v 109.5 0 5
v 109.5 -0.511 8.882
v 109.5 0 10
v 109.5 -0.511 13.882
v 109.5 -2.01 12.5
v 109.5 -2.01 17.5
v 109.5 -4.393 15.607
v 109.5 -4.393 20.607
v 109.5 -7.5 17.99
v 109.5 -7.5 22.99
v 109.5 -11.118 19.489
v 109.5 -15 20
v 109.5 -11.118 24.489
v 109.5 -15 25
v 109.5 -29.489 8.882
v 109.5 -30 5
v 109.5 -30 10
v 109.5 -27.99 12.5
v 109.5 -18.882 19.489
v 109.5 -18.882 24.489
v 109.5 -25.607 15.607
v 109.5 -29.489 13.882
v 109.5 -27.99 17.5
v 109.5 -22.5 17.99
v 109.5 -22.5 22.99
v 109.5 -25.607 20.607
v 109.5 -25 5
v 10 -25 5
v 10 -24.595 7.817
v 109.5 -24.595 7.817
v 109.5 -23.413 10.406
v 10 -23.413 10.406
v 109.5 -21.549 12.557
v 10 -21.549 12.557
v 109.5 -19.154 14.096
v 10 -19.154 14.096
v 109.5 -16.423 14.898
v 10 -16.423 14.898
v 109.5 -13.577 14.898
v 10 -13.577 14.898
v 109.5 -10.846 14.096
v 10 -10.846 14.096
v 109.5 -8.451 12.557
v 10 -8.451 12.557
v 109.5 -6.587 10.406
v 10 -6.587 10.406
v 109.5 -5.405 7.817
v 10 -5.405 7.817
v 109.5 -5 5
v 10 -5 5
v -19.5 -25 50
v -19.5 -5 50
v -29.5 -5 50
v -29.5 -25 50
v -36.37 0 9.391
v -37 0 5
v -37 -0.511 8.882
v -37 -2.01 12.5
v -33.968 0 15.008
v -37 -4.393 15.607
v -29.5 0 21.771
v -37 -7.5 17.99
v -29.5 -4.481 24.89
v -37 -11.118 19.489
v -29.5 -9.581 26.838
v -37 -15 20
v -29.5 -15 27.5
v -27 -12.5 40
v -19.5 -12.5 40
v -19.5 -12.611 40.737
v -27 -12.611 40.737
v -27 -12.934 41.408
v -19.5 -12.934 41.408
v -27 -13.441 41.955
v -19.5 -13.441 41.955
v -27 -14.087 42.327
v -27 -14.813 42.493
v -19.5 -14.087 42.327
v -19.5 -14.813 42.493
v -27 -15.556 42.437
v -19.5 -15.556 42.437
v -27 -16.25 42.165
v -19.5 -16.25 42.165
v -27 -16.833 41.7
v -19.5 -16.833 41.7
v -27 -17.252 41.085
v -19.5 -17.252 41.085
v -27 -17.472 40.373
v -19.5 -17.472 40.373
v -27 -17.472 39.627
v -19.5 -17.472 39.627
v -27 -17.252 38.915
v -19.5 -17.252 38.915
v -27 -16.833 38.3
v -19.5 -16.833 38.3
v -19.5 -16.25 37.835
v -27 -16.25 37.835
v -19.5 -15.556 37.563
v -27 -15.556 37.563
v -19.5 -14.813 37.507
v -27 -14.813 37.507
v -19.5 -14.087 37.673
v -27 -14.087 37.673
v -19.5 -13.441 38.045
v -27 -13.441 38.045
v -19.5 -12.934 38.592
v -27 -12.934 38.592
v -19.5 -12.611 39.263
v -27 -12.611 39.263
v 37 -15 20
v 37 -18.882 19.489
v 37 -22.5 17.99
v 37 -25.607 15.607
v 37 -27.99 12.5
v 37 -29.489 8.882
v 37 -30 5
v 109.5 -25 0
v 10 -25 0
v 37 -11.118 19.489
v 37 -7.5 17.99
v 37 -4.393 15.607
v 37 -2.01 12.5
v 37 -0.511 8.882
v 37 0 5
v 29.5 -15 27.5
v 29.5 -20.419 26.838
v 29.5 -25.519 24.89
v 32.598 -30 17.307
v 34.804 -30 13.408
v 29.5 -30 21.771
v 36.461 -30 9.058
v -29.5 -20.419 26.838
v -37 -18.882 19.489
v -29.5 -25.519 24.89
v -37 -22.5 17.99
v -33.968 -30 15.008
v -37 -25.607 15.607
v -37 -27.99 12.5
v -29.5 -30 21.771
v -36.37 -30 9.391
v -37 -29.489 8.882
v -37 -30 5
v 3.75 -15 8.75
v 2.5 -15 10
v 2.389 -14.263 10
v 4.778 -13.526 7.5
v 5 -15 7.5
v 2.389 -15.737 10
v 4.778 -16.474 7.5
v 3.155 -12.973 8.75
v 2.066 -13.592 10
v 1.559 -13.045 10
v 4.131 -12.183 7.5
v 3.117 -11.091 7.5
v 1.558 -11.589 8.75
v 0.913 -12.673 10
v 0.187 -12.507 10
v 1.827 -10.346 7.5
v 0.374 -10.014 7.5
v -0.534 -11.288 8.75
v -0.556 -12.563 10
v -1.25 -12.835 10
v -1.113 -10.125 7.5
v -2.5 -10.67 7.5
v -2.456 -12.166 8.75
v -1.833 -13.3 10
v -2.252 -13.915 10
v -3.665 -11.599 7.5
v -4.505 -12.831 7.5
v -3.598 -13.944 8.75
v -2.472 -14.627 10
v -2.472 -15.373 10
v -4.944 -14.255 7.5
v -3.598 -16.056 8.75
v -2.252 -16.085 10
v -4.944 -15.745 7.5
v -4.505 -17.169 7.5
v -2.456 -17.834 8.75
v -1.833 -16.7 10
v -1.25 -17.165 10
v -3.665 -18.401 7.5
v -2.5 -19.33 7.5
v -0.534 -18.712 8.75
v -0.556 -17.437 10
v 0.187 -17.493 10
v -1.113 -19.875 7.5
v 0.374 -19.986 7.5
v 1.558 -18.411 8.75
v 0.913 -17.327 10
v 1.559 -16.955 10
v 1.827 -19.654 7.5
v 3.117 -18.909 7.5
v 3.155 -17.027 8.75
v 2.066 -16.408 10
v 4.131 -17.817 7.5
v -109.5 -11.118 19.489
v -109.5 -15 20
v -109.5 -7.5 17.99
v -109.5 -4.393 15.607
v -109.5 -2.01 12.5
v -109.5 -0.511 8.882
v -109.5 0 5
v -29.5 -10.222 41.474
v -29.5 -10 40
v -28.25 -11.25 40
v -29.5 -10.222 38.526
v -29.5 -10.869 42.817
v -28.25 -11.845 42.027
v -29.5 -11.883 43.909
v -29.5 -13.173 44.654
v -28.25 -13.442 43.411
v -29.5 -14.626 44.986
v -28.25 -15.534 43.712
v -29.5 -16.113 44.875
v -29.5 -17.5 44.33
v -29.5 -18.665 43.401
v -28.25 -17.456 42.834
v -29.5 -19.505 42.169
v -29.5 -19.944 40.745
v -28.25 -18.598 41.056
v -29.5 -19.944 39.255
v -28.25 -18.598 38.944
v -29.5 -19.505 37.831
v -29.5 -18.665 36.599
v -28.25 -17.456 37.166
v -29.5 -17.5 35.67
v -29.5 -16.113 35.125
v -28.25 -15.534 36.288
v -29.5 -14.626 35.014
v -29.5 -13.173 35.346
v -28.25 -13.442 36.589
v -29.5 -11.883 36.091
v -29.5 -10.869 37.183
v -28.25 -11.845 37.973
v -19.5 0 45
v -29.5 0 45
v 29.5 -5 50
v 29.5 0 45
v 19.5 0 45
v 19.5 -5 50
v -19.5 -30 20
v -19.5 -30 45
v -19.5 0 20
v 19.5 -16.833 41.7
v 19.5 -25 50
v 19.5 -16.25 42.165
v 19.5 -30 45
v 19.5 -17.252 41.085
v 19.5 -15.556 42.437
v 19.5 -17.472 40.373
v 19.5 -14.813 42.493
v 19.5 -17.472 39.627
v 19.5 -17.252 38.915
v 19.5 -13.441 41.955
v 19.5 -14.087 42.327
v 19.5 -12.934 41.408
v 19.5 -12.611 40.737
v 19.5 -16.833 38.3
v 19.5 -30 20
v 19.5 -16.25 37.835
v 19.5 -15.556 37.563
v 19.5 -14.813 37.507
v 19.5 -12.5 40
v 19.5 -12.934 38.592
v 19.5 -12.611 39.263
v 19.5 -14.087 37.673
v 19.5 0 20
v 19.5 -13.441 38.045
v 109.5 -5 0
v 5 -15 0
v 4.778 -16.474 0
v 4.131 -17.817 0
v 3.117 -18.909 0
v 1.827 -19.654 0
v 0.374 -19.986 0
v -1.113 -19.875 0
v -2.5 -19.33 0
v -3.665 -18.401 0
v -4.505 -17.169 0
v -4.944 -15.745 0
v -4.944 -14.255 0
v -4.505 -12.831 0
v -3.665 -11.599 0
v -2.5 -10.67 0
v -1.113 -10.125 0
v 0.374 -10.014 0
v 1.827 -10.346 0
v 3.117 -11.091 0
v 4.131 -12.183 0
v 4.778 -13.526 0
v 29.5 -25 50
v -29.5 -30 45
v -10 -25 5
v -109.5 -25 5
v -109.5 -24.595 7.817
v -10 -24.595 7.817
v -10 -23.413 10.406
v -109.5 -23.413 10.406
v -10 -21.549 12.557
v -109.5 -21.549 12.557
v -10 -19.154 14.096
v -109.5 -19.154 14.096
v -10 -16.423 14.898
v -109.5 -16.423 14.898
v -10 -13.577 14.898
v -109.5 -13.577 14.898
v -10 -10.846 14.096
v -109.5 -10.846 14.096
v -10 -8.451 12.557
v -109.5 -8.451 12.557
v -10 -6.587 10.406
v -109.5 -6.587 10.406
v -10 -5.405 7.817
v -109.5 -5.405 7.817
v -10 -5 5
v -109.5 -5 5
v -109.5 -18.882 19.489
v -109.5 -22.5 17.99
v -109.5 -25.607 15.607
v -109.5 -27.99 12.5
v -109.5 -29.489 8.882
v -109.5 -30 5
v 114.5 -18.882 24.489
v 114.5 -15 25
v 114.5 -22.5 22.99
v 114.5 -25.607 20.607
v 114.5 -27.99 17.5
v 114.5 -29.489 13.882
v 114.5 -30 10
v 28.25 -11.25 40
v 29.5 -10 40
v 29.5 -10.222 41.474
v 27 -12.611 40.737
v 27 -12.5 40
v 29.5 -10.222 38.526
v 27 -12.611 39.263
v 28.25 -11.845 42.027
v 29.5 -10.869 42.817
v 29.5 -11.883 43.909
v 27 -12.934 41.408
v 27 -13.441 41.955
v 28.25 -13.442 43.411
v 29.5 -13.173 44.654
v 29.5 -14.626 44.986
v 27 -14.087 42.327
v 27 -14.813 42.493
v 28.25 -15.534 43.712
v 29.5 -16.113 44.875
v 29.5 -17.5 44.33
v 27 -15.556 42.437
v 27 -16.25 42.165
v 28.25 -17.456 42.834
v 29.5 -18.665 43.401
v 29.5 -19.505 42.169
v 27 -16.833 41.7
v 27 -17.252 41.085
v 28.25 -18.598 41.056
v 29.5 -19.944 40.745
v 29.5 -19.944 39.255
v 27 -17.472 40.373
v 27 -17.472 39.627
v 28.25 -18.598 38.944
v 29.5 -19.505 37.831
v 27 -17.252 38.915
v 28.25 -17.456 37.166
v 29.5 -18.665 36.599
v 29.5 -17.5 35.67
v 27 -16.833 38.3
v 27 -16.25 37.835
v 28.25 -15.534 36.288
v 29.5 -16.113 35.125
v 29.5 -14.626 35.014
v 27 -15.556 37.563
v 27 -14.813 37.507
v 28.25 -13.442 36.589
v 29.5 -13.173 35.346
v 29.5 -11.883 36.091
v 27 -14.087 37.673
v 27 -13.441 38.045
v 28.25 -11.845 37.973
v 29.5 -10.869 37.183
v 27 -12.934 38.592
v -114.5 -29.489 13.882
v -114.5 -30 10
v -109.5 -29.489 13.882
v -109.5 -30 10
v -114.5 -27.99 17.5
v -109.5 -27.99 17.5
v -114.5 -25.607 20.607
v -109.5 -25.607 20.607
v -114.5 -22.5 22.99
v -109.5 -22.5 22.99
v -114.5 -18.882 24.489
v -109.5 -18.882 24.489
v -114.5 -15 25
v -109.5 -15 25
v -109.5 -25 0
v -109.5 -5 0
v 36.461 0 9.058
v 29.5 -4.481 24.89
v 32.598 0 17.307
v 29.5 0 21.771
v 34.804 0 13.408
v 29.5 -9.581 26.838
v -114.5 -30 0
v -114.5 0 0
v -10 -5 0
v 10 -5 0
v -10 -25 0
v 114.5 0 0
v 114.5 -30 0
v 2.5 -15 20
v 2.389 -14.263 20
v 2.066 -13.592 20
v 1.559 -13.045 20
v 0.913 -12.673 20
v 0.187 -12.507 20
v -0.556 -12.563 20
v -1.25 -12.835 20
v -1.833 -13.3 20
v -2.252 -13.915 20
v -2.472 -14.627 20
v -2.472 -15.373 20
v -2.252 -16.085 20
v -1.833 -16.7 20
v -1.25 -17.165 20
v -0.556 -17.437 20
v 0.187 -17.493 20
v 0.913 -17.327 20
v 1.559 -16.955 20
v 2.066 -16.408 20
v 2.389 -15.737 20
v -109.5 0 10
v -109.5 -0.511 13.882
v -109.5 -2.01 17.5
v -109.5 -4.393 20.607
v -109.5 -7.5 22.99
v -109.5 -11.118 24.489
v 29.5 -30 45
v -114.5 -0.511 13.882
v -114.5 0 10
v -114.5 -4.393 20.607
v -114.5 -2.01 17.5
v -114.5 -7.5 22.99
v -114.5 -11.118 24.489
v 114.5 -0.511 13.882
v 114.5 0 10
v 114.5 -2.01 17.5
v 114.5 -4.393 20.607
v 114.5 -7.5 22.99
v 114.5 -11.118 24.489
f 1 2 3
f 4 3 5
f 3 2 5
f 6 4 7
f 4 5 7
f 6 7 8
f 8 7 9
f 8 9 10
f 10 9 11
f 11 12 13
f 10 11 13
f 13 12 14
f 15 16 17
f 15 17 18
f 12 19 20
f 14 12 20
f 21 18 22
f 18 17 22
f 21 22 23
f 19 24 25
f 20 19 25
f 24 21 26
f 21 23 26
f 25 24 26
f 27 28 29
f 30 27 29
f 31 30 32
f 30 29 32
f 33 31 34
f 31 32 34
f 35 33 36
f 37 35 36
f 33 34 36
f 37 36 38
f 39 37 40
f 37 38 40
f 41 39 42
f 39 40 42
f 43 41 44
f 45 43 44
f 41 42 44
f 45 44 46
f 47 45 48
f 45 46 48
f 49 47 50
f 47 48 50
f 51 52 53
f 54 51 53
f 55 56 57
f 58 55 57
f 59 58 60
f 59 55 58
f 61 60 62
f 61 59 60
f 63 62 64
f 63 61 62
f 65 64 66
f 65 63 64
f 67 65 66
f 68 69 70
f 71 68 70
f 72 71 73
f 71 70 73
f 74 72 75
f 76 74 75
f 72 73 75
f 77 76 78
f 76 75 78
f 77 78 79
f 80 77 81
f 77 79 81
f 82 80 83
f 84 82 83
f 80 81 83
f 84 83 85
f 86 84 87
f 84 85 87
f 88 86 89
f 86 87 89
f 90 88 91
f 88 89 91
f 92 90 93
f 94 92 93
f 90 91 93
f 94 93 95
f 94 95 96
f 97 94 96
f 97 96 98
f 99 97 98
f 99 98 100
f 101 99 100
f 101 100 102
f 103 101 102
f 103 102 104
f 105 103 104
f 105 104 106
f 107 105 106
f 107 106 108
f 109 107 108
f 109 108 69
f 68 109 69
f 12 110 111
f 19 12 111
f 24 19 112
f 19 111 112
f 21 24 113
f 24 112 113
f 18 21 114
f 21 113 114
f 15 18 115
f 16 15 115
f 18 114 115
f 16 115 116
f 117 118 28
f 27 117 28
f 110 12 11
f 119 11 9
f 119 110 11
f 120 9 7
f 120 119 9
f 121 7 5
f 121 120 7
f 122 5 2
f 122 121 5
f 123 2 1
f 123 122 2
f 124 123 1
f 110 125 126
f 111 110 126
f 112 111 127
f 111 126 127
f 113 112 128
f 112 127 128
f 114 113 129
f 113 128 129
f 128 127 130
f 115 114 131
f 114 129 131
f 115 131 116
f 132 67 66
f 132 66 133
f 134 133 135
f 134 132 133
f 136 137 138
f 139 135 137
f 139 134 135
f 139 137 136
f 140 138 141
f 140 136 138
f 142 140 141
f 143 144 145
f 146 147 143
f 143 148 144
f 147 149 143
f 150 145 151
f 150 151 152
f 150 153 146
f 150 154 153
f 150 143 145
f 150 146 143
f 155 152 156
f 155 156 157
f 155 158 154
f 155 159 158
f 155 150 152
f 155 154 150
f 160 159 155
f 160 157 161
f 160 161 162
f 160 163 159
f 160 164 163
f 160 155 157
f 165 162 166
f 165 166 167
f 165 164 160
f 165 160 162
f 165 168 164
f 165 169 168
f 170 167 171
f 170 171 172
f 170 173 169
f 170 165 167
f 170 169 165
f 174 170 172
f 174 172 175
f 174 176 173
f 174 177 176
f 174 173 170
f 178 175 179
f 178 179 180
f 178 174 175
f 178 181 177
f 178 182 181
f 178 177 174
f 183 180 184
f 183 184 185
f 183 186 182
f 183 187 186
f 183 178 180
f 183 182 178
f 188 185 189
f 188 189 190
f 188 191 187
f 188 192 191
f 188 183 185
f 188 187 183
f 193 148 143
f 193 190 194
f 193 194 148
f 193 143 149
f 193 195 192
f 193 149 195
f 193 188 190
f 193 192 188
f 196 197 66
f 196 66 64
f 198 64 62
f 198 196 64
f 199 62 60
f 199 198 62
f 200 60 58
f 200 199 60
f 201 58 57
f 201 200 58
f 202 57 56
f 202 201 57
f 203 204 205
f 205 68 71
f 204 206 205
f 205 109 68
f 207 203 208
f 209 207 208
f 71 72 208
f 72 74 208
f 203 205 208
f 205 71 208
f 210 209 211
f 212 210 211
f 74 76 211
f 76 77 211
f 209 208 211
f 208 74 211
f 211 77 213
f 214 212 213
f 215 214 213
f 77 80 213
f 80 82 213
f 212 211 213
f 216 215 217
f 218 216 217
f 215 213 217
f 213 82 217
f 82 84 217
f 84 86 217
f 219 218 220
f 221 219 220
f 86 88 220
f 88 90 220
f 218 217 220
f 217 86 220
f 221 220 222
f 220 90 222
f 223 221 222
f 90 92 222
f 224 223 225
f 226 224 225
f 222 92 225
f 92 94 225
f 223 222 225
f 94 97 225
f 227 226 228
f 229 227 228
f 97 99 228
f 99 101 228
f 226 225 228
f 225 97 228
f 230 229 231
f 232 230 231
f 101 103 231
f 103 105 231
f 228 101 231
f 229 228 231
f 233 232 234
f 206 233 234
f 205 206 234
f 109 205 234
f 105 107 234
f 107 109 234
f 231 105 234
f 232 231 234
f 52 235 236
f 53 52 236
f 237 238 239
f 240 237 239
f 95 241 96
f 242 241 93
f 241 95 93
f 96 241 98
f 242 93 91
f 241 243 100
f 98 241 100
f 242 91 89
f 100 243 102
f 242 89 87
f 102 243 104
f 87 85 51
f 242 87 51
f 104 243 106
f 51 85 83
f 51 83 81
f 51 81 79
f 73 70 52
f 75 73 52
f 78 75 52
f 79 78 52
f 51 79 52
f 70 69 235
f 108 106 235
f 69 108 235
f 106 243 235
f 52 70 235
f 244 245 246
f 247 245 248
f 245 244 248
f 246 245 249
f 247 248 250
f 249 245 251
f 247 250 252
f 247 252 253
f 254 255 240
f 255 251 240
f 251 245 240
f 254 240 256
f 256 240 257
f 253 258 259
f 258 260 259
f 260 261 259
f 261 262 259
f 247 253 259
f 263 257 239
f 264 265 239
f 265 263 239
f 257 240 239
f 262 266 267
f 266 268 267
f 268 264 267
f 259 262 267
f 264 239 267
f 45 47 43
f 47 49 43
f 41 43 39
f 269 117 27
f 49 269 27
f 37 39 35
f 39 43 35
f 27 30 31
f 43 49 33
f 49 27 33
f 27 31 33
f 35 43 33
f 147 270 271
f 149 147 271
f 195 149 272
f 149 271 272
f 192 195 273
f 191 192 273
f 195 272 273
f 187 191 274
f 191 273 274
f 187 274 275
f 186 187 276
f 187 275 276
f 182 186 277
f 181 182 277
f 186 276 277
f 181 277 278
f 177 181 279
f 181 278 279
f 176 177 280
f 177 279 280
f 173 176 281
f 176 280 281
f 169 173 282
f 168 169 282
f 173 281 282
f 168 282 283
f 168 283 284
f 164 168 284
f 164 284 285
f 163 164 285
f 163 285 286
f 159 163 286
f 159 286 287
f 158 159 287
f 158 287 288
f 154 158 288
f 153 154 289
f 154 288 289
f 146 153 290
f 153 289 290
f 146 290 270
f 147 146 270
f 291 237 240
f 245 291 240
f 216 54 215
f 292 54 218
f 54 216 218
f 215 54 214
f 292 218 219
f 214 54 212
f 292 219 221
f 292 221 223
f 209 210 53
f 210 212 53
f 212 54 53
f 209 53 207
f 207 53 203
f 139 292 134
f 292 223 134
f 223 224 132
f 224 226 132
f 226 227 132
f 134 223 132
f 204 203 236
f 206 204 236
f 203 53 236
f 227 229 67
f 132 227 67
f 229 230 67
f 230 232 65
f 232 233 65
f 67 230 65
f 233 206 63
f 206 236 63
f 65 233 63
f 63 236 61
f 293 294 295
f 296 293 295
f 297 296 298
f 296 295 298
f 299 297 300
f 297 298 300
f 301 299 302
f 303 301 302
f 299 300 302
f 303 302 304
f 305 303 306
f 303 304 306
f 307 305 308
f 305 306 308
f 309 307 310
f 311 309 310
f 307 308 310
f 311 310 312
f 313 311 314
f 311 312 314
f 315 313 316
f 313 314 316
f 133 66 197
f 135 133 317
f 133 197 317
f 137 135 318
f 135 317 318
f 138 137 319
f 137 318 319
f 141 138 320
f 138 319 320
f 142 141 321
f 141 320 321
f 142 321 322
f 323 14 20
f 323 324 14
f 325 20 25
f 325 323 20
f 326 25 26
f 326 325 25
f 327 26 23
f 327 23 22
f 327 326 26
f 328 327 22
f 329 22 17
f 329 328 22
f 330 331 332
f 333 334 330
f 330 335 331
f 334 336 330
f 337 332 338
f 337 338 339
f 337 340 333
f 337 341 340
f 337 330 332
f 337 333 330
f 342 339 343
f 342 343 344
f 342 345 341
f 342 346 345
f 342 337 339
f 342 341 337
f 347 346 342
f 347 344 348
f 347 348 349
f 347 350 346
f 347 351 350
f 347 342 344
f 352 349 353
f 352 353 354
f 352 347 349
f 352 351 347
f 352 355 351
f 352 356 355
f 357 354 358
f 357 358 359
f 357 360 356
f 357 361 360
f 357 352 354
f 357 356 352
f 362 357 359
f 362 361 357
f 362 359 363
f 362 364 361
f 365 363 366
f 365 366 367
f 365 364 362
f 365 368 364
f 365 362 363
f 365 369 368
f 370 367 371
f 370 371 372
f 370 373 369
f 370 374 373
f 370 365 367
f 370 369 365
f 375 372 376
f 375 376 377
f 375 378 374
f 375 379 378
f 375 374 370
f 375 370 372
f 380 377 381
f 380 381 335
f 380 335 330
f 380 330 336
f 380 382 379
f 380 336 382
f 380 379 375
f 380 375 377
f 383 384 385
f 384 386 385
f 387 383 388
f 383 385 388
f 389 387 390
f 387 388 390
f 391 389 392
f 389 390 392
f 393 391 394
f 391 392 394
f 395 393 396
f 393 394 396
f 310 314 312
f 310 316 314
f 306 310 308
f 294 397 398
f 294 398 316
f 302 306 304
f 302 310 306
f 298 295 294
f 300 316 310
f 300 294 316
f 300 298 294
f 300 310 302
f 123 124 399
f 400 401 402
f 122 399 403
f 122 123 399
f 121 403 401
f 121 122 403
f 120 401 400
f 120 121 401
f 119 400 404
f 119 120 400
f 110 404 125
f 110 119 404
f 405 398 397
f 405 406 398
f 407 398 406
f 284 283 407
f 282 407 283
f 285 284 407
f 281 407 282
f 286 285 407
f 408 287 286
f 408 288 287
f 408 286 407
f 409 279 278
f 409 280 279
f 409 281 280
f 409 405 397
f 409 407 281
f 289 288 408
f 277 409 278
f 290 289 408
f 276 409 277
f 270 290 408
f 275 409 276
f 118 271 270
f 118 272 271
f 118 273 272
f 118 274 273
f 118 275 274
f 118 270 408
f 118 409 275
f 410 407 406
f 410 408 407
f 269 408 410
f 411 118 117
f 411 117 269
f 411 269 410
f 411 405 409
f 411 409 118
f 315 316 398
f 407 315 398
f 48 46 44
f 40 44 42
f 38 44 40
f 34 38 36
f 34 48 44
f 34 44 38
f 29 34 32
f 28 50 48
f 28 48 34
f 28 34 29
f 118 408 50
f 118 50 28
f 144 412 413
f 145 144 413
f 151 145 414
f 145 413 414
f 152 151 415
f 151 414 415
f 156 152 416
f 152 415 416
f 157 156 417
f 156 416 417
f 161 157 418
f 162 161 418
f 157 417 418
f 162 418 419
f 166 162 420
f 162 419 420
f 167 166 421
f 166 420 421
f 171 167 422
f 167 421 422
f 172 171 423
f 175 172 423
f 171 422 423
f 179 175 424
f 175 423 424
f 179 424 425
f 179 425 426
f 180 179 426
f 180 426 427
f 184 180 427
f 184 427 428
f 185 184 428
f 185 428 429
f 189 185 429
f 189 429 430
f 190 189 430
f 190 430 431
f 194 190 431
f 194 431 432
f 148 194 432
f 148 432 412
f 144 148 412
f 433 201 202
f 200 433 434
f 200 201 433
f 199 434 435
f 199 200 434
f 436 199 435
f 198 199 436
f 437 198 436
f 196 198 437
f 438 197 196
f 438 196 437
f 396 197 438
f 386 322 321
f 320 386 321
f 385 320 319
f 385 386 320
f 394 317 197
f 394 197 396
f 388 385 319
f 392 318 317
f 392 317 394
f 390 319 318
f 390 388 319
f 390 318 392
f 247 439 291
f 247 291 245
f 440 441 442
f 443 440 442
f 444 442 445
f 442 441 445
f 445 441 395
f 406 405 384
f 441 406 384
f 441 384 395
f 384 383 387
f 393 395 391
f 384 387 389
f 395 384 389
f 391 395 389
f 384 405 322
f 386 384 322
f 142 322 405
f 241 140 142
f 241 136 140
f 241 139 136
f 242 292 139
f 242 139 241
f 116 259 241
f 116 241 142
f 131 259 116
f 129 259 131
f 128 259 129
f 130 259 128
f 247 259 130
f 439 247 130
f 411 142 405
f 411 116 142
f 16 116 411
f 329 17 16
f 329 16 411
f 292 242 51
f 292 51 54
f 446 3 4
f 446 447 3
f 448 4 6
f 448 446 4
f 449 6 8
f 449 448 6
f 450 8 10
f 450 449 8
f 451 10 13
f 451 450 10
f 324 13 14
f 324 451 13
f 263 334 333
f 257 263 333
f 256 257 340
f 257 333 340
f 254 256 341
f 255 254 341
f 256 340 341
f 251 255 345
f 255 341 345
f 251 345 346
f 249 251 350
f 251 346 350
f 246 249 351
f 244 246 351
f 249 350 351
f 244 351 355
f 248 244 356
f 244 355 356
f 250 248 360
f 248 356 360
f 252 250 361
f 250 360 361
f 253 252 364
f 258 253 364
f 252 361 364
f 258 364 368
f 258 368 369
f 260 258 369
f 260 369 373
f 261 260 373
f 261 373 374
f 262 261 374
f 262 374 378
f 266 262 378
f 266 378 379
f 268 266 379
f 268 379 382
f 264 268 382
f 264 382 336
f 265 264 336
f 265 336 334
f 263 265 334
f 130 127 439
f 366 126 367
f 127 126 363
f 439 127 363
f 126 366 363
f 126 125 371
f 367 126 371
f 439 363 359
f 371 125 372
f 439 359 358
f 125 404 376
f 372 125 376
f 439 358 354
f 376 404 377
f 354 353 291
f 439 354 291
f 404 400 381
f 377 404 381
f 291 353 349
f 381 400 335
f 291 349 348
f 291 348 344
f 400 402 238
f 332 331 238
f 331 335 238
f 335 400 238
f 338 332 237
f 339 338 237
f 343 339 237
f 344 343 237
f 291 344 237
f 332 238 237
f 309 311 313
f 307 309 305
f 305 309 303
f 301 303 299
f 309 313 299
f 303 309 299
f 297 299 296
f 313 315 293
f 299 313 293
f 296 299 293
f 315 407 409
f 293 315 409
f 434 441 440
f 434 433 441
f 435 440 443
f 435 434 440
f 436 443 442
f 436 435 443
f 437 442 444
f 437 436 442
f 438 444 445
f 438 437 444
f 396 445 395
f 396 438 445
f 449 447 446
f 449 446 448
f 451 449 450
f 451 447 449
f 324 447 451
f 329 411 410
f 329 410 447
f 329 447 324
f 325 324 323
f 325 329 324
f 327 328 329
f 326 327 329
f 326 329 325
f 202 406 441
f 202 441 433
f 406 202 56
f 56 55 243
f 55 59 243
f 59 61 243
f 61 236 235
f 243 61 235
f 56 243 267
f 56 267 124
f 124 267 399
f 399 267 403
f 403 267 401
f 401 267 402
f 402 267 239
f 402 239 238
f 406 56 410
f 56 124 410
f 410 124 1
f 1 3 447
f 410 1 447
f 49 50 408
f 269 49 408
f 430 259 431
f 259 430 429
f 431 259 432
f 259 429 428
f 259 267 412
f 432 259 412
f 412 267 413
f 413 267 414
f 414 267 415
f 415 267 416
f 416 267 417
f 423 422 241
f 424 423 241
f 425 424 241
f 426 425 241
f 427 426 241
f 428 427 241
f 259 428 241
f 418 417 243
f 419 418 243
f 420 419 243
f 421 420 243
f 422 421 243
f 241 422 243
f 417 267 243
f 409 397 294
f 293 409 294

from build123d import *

# Parameters (mm, degrees)
F1_DEPTH     = 30
F2_R         = 14.99999
F4_DEPTH     = 219.001
F5_T1_DEPTH  = 2e-05
F5_T6_ANGLE  = 163.702935025
F5_T12_ANGLE = 163.702935025
F5_T18_ANGLE = 163.702935025
F5_T24_ANGLE = 163.702935025
F6_SIZE      = 5
F7_R         = 2.5
F8_DEPTH     = 139.001
F9_W         = 20
F9_H         = 20
F11_R        = 2.5
F12_DEPTH    = 20.001
F13_SIZE     = 2.5
F14_W        = 5
F14_H        = 25
F15_DEPTH    = 30
F16_R        = 14.99999
F17_R        = 5
F18_DEPTH    = 7.5
F19_SIZE     = 2.49999


# Not quite as in the source:
# - a fillet or chamfer that OpenCascade refuses, or shapes differently, is made with other operations: its cross-section is extruded or revolved along the edge and cut away or added
# - a fillet or chamfer is up to 0.001 mm smaller than in the source, because OpenCascade refuses the exact size


with BuildPart() as f1:
    # F0 (on Front) → F1 (new body)
    with BuildSketch(Plane.XZ):
        Polygon((-109.5, 0), (0, 0), (109.5, 0), (109.5, 20), (29.5, 20), (29.5, 50), (19.5, 50), (19.5, 20), (0, 20), (-19.5, 20), (-19.5, 50), (-29.5, 50), (-29.5, 20), (-109.5, 20), align=None)
    extrude(amount=F1_DEPTH)

    # F2 (radius 15 in the source; OpenCascade refuses exactly that, so slightly less here)
    f2_edges = [f1.edges().sort_by_distance(p)[0] for p in [
        (-69.5, 0, 20),
        (-69.5, -30, 20),
        (69.5, 0, 20),
        (69.5, -30, 20),
    ]]
    fillet(f2_edges, radius=F2_R)

    # F3 (on face) → F4 (cut, through all)
    with BuildSketch(Plane(origin=(-109.5, 0, 0), x_dir=(0, -1, 0), z_dir=(-1, 0, 0))):
        with BuildLine():
            Line((25, 0), (25, 5))
            ThreePointArc((25, 5), (15, 15), (5, 5))
            Line((5, 5), (5, 0))
            Line((5, 0), (25, 0))
        make_face()
    extrude(amount=-F4_DEPTH, mode=Mode.SUBTRACT)

    # F5: chamfer of 7.5 on 4 edges, made by hand

    # F5_s2 → F5_t1 (join)
    with BuildSketch(Plane.XZ.offset(14.99999)):
        Polygon((-37, 20), (-29.5, 27.5), (-29.5, 20), align=None)
        Polygon((37, 20), (29.5, 27.5), (29.5, 20), align=None)
    extrude(amount=F5_T1_DEPTH)


with BuildPart() as f5_tool4:
    # F5_s5 → F5_t6 (revolve)
    with BuildSketch(Plane(origin=(0, -12.4720838446, -3.6463990318), x_dir=(1, 0, 0), z_dir=(0, -0.9598196681, -0.2806175417))):
        Polygon((-37, -5.9916217418), (-29.5, -13.4916217418), (-29.5, -5.9916217418), align=None)
    revolve(axis=Axis((-29.5, -14.99999, 5.00001), (1, 0, 0)), revolution_arc=F5_T6_ANGLE)

    split(bisect_by=Plane.XZ, keep=Keep.TOP)

    split(bisect_by=Plane.XY, keep=Keep.TOP)


with BuildPart() as f1_1:
    add(f1.part)

    # F5_t3: union F5_tool4
    add(f5_tool4.part)


with BuildPart() as f5_tool10:
    # F5_s11 → F5_t12 (revolve)
    with BuildSketch(Plane(origin=(0, -12.4720838446, -3.6463990318), x_dir=(1, 0, 0), z_dir=(0, -0.9598196681, -0.2806175417))):
        Polygon((29.5, -13.4916217418), (37, -5.9916217418), (29.5, -5.9916217418), align=None)
    revolve(axis=Axis((29.5, -14.99999, 5.00001), (1, 0, 0)), revolution_arc=F5_T12_ANGLE)

    split(bisect_by=Plane.XZ, keep=Keep.TOP)

    split(bisect_by=Plane.XY, keep=Keep.TOP)


with BuildPart() as f1_2:
    add(f1_1.part)

    # F5_t9: union F5_tool10
    add(f5_tool10.part)


with BuildPart() as f5_tool16:
    # F5_s17 → F5_t18 (revolve)
    with BuildSketch(Plane.XZ.offset(15.00001)):
        Polygon((37, 20), (29.5, 27.5), (29.5, 20), align=None)
    revolve(axis=Axis((29.5, -15.00001, 5.00001), (1, 0, 0)), revolution_arc=F5_T18_ANGLE)

    split(bisect_by=Plane.XY, keep=Keep.TOP)

    split(bisect_by=Plane.XZ.offset(30), keep=Keep.BOTTOM)


with BuildPart() as f1_3:
    add(f1_2.part)

    # F5_t15: union F5_tool16
    add(f5_tool16.part)


with BuildPart() as f5_tool22:
    # F5_s23 → F5_t24 (revolve)
    with BuildSketch(Plane.XZ.offset(15.00001)):
        Polygon((-37, 20), (-29.5, 27.5), (-29.5, 20), align=None)
    revolve(axis=Axis((-29.5, -15.00001, 5.00001), (1, 0, 0)), revolution_arc=F5_T24_ANGLE)

    split(bisect_by=Plane.XY, keep=Keep.TOP)

    split(bisect_by=Plane.XZ.offset(30), keep=Keep.BOTTOM)


with BuildPart() as f1_4:
    add(f1_3.part)

    # F5_t21: union F5_tool22
    add(f5_tool22.part)

    # F6
    f6_edges = [f1_4.edges().sort_by_distance(p)[0] for p in [
        (-24.5, 0, 50),
        (-24.5, -30, 50),
        (24.5, 0, 50),
        (24.5, -30, 50),
    ]]
    chamfer(f6_edges, length=F6_SIZE)

    # F7 (on face) → F8 (cut, through all)
    with BuildSketch(Plane.YZ.offset(29.5)):
        with Locations((-15, 40)):
            Circle(F7_R)
    extrude(amount=-F8_DEPTH, mode=Mode.SUBTRACT)

    # F9 (on face) → F10 (join, up to the next surface of F1)
    with BuildSketch(Plane(origin=(0, 0, 0), x_dir=(1, 0, 0), z_dir=(0, 0, -1))):
        with Locations((0, 15)):
            Rectangle(F9_W, F9_H)
    extrude(until=Until.NEXT, dir=(0, 0, 1))

    # F11 (on face) → F12 (cut, through all)
    with BuildSketch(Plane.XY.offset(20)):
        with Locations((0, -15)):
            Circle(F11_R)
    extrude(amount=-F12_DEPTH, mode=Mode.SUBTRACT)

    # F13
    f13_edges = [f1_4.edges().sort_by_distance(p)[0] for p in [
        (-29.5, -17.5, 40),
        (29.5, -17.5, 40),
    ]]
    chamfer(f13_edges, length=F13_SIZE)

    # F14 (on face) → F15 (join, through all)
    with BuildSketch(Plane.XZ.offset(30)):
        with Locations((-112, 12.5)):
            Rectangle(F14_W, F14_H)
        with Locations((112, 12.5)):
            Rectangle(F14_W, F14_H)
    extrude(amount=-F15_DEPTH)

    # F16 (radius 15 in the source; OpenCascade refuses exactly that, so slightly less here)
    f16_edges = [f1_4.edges().sort_by_distance(p)[0] for p in [
        (112, 0, 25),
        (112, -30, 25),
        (-112, -30, 25),
        (-112, 0, 25),
    ]]
    fillet(f16_edges, radius=F16_R)

    # F17 (on face) → F18 (cut)
    with BuildSketch(Plane(origin=(0, 0, 0), x_dir=(1, 0, 0), z_dir=(0, 0, -1))):
        with Locations((0, 15)):
            Circle(F17_R)
    extrude(amount=-F18_DEPTH, mode=Mode.SUBTRACT)

    # F19 (size 2.5 in the source; OpenCascade refuses exactly that, so slightly less here)
    f19_edges = [f1_4.edges().sort_by_distance(p)[0] for p in [
        (-2.5, -15, 7.5),
    ]]
    chamfer(f19_edges, length=F19_SIZE)


solid = f1_4.part
